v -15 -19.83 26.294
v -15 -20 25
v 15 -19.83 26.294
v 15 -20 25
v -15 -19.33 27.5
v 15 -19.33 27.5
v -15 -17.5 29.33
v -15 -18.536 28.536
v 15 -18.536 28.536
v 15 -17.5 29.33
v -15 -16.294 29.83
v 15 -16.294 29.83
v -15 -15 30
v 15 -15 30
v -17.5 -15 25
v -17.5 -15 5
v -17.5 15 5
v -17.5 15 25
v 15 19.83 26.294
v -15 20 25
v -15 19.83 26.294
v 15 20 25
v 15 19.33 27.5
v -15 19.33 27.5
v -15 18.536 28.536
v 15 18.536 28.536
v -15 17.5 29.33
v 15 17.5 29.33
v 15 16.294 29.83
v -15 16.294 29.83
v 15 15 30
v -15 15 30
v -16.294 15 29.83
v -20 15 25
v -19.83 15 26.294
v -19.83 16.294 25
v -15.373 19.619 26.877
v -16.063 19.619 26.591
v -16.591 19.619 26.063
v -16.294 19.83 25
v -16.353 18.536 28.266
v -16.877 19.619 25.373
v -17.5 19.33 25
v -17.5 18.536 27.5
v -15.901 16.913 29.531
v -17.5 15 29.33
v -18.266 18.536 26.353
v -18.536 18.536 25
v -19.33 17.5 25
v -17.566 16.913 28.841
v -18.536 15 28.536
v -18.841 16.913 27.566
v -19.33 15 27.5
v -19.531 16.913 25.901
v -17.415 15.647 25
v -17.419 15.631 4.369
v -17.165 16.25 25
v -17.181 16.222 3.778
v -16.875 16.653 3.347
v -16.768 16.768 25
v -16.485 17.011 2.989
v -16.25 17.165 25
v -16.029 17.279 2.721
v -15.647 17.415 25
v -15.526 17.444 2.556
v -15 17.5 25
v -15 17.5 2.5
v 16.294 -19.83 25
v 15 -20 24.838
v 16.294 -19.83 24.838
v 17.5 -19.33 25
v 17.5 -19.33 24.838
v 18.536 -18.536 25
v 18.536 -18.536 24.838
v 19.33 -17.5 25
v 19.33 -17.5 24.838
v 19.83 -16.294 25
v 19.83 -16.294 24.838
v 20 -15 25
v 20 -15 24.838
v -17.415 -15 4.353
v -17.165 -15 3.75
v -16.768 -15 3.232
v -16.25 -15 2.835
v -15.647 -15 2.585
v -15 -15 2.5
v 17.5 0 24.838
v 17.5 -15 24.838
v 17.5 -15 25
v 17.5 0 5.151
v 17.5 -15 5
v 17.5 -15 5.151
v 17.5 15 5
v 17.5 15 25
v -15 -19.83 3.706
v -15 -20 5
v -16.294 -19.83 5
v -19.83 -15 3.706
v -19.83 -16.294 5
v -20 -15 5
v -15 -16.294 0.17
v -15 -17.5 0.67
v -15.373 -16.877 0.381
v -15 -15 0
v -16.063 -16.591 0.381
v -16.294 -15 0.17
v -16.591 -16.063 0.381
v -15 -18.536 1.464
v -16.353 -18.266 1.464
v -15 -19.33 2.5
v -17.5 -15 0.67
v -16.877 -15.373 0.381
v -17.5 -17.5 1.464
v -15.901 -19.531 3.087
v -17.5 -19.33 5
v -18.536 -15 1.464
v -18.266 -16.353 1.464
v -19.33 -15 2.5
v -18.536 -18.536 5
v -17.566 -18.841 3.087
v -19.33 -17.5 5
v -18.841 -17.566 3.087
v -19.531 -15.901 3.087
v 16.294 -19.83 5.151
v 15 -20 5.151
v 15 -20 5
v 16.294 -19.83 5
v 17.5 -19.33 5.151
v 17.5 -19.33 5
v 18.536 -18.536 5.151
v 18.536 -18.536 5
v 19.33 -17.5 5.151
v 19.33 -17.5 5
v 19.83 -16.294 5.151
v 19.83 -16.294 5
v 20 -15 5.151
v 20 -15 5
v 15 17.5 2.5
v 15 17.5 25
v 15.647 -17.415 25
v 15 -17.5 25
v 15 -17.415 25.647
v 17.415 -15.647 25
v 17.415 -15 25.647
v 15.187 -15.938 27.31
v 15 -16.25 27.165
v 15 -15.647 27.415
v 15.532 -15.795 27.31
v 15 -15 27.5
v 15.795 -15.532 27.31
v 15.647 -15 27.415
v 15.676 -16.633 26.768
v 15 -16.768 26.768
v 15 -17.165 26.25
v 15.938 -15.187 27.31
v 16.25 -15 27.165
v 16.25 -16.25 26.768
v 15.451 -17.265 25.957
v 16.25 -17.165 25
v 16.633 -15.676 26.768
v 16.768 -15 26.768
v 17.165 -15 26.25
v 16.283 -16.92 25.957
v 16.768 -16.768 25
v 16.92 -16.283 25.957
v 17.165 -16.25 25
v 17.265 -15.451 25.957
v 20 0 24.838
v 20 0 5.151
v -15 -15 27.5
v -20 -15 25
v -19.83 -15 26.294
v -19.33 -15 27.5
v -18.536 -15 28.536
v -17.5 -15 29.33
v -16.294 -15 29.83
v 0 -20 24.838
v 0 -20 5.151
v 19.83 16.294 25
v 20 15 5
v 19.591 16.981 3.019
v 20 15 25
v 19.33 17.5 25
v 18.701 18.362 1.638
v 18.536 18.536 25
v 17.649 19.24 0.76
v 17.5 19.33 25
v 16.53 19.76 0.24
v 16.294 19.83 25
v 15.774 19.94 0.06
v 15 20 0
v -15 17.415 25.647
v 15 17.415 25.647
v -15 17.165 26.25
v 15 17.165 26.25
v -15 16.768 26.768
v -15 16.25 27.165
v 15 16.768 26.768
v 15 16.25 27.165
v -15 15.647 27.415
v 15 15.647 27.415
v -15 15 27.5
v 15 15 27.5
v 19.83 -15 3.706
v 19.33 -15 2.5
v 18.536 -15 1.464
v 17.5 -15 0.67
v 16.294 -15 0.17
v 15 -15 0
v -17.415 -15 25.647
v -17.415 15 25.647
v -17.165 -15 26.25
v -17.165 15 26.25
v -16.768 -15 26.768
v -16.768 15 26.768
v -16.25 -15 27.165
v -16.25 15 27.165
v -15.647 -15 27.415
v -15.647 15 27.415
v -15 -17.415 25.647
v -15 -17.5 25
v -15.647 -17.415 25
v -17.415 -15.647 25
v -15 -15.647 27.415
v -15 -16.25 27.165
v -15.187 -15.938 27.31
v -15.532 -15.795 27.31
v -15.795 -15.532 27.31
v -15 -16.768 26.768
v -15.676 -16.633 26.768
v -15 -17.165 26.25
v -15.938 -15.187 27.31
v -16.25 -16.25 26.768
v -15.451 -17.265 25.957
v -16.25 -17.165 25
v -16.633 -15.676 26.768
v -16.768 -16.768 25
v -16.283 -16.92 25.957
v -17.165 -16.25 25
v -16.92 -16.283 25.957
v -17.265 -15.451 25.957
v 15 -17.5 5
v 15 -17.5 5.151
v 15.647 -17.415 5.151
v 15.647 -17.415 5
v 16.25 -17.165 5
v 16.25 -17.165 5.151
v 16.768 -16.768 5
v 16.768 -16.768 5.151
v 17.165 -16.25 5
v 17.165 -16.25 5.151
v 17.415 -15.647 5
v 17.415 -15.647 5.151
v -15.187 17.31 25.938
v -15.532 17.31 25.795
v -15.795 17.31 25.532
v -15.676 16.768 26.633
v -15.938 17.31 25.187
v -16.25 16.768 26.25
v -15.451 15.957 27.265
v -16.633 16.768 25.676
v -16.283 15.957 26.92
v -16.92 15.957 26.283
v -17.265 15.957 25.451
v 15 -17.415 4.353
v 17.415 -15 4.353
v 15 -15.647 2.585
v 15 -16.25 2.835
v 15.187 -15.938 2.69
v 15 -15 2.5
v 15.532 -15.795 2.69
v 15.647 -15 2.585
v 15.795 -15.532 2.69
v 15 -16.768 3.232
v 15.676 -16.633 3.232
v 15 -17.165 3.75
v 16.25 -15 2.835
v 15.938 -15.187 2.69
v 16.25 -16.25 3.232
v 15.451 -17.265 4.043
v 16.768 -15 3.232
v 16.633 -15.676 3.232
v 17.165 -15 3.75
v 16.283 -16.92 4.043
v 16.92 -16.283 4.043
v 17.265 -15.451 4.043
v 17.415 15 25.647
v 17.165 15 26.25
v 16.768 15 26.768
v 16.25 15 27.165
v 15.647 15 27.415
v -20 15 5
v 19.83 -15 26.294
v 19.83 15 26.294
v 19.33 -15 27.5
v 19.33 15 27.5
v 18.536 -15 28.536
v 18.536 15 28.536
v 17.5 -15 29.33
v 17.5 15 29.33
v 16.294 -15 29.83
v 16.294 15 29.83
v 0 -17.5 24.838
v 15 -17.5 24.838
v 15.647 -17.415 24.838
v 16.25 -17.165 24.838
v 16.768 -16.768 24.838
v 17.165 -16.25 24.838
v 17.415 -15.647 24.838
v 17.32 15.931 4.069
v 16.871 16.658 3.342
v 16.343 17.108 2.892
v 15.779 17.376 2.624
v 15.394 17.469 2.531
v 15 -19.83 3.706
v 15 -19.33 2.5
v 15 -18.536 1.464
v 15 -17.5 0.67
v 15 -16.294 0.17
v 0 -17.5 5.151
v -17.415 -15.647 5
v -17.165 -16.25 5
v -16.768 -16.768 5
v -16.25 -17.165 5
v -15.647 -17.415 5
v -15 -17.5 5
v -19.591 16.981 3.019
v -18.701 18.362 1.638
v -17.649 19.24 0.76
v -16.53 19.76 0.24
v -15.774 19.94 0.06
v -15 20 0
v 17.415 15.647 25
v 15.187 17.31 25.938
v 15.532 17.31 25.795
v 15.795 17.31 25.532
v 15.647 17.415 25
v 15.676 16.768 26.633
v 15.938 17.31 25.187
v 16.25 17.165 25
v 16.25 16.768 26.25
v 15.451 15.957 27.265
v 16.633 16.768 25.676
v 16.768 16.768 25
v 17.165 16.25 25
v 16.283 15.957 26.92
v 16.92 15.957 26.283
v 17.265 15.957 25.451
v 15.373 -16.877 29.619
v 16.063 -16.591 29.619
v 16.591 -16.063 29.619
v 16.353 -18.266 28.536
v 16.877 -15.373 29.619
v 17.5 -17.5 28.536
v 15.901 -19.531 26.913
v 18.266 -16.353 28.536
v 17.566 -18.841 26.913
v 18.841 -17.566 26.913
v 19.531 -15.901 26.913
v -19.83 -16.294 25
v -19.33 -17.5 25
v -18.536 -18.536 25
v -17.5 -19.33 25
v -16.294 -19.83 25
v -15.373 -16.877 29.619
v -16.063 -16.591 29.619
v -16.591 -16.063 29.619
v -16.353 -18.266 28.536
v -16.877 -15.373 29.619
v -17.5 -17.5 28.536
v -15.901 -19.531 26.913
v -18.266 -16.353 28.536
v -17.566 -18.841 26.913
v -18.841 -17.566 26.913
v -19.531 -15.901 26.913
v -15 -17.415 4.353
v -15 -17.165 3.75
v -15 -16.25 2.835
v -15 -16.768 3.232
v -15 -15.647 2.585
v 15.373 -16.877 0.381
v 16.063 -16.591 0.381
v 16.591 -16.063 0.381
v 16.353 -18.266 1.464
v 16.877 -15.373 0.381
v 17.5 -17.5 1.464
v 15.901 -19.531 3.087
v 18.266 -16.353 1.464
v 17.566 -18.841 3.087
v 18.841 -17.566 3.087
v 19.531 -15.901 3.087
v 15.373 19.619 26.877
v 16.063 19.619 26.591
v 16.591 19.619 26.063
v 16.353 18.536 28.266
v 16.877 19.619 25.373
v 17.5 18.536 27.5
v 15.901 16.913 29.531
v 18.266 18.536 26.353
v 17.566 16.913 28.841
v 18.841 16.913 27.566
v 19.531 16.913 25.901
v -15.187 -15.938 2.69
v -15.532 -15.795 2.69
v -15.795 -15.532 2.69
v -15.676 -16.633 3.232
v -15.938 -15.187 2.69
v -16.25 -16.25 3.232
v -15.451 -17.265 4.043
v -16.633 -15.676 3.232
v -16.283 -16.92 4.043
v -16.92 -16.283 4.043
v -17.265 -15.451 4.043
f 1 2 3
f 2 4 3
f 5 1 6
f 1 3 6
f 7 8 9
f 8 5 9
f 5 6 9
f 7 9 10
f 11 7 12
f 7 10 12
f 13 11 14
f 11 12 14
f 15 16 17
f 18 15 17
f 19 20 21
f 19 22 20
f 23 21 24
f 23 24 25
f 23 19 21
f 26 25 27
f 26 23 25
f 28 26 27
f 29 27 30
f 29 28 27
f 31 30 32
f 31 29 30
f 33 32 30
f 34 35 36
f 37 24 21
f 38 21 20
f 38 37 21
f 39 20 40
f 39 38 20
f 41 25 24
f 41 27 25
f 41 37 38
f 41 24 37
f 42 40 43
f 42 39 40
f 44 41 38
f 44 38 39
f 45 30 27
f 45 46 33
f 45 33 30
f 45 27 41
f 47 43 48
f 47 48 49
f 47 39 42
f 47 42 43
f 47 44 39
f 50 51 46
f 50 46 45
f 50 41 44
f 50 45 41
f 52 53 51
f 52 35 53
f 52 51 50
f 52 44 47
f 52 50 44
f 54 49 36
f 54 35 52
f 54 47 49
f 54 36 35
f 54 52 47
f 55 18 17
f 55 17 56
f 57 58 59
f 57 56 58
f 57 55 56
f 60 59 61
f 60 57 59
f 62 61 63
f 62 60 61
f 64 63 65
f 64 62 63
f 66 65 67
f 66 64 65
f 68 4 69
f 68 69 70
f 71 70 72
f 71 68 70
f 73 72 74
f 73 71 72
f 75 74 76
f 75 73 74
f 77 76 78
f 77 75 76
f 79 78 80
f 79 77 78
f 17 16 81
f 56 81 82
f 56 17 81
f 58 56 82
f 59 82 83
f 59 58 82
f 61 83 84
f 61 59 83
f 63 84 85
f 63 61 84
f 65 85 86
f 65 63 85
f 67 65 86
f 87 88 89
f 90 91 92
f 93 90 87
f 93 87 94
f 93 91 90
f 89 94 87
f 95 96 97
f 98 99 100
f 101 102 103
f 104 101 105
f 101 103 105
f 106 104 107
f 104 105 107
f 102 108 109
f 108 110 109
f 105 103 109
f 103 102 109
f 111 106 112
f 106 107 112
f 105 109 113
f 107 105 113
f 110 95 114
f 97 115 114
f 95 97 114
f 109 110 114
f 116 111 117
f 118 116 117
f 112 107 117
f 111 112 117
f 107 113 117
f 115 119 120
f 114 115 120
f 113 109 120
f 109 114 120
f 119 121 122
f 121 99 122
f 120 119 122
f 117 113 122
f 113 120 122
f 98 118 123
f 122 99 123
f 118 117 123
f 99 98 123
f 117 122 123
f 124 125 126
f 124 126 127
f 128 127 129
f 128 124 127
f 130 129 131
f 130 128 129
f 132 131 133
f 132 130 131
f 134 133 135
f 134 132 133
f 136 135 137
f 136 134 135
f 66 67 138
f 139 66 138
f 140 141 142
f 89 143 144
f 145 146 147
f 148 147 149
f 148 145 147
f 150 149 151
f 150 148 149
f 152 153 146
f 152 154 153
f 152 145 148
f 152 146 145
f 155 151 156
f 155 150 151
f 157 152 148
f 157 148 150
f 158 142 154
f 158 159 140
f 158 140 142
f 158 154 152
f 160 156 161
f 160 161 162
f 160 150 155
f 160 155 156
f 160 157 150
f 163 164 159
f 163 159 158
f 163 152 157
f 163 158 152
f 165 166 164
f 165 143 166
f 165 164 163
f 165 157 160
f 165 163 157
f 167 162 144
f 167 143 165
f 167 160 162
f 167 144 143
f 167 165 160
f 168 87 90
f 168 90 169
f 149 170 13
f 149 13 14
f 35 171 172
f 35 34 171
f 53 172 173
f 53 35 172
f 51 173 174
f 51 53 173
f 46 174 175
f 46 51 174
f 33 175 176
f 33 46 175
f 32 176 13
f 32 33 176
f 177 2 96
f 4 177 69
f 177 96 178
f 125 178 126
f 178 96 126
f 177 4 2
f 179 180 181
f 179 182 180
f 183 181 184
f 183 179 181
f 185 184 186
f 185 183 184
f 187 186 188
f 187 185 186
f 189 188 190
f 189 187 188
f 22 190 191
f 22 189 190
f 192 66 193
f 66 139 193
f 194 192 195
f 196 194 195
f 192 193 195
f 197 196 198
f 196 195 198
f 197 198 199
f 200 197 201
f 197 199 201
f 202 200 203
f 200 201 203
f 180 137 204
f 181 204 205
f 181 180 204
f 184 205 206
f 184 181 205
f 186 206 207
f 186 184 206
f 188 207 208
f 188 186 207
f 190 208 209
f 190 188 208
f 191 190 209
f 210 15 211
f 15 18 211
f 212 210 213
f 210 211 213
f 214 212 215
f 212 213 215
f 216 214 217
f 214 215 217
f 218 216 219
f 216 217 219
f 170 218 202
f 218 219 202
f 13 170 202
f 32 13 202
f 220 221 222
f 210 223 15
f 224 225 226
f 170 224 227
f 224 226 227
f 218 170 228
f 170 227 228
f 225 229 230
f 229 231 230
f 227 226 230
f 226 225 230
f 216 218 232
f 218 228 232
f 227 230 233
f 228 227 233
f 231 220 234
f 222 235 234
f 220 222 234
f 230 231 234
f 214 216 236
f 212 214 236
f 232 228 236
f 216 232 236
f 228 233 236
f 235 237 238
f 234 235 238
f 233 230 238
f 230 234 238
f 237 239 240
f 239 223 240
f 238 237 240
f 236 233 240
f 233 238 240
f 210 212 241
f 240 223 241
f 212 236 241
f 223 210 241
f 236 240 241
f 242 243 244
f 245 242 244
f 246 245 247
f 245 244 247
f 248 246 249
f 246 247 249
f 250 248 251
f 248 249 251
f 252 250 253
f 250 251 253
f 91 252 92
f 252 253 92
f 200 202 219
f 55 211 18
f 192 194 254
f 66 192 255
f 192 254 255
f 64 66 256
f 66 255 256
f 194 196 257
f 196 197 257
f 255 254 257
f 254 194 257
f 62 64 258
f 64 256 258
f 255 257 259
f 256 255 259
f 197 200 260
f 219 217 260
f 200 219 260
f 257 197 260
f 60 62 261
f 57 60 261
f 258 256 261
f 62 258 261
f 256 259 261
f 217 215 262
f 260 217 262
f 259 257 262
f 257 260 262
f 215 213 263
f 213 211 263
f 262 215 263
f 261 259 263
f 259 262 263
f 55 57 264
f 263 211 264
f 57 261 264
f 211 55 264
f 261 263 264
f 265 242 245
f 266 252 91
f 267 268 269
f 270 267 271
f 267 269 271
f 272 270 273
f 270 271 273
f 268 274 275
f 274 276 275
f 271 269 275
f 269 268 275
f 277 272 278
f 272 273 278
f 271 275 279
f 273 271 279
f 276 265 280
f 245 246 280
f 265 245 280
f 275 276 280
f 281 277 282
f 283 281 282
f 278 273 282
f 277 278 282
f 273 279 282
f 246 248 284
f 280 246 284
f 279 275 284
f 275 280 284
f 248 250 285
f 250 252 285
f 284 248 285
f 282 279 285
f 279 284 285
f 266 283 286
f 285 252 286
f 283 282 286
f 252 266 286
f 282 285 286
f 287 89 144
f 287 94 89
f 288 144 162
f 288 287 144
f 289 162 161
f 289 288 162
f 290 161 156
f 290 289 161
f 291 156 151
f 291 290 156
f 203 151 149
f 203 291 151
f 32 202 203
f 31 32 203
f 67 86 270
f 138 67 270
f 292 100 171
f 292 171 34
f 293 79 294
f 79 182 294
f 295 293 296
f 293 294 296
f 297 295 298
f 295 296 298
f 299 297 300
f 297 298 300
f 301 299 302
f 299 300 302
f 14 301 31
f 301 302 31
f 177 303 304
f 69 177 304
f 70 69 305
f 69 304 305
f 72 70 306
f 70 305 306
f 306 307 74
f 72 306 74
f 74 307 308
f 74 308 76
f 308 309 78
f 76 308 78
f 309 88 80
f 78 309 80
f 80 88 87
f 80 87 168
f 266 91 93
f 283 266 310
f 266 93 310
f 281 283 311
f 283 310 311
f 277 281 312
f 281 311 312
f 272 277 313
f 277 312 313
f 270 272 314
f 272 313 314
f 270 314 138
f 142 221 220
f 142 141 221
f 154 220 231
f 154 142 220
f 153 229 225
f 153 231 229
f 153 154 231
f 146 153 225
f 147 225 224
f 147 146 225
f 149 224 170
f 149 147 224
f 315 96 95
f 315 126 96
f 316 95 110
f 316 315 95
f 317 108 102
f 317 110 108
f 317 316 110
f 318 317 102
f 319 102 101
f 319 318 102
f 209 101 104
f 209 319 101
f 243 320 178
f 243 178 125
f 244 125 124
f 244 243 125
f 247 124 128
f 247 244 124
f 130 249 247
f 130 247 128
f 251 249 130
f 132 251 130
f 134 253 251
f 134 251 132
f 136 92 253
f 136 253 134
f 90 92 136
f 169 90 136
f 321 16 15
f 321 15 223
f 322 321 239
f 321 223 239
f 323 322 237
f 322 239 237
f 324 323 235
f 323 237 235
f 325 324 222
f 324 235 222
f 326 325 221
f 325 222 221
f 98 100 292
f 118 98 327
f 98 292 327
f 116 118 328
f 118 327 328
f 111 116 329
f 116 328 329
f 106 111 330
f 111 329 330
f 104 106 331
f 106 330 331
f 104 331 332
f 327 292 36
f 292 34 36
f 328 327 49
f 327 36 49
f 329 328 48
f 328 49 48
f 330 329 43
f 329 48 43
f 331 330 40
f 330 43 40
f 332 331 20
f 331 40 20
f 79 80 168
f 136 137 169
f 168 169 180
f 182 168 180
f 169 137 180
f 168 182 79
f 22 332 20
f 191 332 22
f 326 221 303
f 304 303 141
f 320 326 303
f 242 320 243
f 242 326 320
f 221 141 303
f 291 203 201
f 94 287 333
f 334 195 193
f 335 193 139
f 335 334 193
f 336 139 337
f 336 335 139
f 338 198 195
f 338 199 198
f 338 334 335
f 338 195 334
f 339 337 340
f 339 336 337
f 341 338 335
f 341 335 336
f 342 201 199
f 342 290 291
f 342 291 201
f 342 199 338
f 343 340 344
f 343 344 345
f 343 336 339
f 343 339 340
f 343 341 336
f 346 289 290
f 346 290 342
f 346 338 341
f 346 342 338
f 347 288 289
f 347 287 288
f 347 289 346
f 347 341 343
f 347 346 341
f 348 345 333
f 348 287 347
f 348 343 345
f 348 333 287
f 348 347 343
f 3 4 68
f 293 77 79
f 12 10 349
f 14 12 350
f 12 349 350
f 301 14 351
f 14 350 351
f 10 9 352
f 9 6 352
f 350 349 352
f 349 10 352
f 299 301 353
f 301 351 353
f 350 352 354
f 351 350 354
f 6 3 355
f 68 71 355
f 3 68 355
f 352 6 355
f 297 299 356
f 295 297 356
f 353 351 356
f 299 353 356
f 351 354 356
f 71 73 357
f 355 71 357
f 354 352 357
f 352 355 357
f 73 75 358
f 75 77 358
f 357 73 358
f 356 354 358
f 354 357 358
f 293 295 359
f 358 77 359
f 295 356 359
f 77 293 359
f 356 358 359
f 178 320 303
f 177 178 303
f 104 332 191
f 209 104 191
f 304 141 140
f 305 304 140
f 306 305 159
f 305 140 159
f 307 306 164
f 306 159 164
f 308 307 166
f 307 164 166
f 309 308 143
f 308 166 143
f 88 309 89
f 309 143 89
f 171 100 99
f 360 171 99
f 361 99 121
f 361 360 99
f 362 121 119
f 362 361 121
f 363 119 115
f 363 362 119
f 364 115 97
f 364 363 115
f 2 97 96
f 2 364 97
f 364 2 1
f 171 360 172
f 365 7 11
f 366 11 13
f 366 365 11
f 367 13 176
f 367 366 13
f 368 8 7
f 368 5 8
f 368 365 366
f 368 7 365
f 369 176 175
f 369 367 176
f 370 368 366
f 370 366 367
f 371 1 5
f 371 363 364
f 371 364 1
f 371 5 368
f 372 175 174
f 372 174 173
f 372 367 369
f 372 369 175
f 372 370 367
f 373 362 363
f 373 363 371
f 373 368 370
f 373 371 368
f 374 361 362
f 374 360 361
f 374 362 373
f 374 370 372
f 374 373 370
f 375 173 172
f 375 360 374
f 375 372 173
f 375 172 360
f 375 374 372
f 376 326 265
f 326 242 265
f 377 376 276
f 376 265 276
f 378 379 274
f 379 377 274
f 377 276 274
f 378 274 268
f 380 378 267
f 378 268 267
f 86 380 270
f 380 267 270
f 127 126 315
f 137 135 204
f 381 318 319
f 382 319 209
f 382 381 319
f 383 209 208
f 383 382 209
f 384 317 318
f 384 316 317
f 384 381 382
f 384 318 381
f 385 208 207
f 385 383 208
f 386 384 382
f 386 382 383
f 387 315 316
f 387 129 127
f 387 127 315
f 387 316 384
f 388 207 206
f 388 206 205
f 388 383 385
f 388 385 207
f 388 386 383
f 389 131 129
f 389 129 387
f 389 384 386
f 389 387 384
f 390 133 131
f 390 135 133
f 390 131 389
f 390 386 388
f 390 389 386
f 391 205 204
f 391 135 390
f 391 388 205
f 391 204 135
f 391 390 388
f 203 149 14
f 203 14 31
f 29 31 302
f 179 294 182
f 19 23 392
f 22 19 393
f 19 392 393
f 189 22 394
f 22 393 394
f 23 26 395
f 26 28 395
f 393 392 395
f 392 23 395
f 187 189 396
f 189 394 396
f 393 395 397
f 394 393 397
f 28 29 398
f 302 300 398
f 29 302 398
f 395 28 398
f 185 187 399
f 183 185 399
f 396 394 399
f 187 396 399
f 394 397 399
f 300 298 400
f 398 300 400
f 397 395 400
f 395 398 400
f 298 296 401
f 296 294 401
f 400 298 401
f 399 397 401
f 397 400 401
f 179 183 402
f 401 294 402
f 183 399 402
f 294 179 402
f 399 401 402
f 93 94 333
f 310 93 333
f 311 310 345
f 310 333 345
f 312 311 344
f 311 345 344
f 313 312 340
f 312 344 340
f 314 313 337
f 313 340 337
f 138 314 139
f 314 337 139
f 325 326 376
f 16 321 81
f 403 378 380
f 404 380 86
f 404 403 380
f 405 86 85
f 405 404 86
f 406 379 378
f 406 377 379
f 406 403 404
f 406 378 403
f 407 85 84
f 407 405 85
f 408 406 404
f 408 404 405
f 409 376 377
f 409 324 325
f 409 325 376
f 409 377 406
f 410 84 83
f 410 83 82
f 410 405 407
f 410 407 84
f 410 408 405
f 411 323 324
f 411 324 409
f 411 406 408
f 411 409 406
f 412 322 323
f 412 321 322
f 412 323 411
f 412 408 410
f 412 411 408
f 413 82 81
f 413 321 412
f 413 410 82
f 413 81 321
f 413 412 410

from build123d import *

# Parameters (mm, degrees)
F0_W     = 40
F0_H     = 40
F1_DEPTH = 30
F2_R     = 5
F3_T     = -2.5
F4_W     = 20.2598124743
F4_H     = 19.6875007823
F5_DEPTH = 61


# Not quite as in the source:
# - a shell that OpenCascade refuses in one call is made with other operations: the cavity is built on its own and cut out


with BuildPart() as f1:
    # F0 (on Top) → F1 (new body)
    with BuildSketch(Plane.XY):
        Rectangle(F0_W, F0_H)
    extrude(amount=F1_DEPTH)

    # F2
    f2_edges = [f1.edges().sort_by_distance(p)[0] for p in [
        (-20, -20, 15),
        (20, -20, 15),
        (0, -20, 0),
        (0, -20, 30),
        (-20, 0, 30),
        (20, 0, 30),
        (0, 20, 30),
        (20, 20, 15),
        (20, 0, 0),
        (-20, 20, 15),
        (-20, 0, 0),
    ]]
    fillet(f2_edges, radius=F2_R)

    # F3: a shell. OpenCascade refuses it in one call, so the cavity is built on its own and cut out:
    # the body offset inwards by the wall thickness, plus a prism from it out through each open face.
    f3_core = offset(f1.part, amount=F3_T, mode=Mode.PRIVATE)
    f3_exits = [f3_core.faces().sort_by_distance(p)[0] for p in [
        (0, 0, 27.5),
    ]]
    add(f3_core, mode=Mode.SUBTRACT)
    extrude(f3_exits, amount=-F3_T, mode=Mode.SUBTRACT)

    # F4 (on Front) → F5 (cut)
    with BuildSketch(Plane.XZ):
        with Locations((10.1299062371, 14.9945500307)):
            Rectangle(F4_W, F4_H)
    extrude(amount=F5_DEPTH, mode=Mode.SUBTRACT)


solid = f1.part
